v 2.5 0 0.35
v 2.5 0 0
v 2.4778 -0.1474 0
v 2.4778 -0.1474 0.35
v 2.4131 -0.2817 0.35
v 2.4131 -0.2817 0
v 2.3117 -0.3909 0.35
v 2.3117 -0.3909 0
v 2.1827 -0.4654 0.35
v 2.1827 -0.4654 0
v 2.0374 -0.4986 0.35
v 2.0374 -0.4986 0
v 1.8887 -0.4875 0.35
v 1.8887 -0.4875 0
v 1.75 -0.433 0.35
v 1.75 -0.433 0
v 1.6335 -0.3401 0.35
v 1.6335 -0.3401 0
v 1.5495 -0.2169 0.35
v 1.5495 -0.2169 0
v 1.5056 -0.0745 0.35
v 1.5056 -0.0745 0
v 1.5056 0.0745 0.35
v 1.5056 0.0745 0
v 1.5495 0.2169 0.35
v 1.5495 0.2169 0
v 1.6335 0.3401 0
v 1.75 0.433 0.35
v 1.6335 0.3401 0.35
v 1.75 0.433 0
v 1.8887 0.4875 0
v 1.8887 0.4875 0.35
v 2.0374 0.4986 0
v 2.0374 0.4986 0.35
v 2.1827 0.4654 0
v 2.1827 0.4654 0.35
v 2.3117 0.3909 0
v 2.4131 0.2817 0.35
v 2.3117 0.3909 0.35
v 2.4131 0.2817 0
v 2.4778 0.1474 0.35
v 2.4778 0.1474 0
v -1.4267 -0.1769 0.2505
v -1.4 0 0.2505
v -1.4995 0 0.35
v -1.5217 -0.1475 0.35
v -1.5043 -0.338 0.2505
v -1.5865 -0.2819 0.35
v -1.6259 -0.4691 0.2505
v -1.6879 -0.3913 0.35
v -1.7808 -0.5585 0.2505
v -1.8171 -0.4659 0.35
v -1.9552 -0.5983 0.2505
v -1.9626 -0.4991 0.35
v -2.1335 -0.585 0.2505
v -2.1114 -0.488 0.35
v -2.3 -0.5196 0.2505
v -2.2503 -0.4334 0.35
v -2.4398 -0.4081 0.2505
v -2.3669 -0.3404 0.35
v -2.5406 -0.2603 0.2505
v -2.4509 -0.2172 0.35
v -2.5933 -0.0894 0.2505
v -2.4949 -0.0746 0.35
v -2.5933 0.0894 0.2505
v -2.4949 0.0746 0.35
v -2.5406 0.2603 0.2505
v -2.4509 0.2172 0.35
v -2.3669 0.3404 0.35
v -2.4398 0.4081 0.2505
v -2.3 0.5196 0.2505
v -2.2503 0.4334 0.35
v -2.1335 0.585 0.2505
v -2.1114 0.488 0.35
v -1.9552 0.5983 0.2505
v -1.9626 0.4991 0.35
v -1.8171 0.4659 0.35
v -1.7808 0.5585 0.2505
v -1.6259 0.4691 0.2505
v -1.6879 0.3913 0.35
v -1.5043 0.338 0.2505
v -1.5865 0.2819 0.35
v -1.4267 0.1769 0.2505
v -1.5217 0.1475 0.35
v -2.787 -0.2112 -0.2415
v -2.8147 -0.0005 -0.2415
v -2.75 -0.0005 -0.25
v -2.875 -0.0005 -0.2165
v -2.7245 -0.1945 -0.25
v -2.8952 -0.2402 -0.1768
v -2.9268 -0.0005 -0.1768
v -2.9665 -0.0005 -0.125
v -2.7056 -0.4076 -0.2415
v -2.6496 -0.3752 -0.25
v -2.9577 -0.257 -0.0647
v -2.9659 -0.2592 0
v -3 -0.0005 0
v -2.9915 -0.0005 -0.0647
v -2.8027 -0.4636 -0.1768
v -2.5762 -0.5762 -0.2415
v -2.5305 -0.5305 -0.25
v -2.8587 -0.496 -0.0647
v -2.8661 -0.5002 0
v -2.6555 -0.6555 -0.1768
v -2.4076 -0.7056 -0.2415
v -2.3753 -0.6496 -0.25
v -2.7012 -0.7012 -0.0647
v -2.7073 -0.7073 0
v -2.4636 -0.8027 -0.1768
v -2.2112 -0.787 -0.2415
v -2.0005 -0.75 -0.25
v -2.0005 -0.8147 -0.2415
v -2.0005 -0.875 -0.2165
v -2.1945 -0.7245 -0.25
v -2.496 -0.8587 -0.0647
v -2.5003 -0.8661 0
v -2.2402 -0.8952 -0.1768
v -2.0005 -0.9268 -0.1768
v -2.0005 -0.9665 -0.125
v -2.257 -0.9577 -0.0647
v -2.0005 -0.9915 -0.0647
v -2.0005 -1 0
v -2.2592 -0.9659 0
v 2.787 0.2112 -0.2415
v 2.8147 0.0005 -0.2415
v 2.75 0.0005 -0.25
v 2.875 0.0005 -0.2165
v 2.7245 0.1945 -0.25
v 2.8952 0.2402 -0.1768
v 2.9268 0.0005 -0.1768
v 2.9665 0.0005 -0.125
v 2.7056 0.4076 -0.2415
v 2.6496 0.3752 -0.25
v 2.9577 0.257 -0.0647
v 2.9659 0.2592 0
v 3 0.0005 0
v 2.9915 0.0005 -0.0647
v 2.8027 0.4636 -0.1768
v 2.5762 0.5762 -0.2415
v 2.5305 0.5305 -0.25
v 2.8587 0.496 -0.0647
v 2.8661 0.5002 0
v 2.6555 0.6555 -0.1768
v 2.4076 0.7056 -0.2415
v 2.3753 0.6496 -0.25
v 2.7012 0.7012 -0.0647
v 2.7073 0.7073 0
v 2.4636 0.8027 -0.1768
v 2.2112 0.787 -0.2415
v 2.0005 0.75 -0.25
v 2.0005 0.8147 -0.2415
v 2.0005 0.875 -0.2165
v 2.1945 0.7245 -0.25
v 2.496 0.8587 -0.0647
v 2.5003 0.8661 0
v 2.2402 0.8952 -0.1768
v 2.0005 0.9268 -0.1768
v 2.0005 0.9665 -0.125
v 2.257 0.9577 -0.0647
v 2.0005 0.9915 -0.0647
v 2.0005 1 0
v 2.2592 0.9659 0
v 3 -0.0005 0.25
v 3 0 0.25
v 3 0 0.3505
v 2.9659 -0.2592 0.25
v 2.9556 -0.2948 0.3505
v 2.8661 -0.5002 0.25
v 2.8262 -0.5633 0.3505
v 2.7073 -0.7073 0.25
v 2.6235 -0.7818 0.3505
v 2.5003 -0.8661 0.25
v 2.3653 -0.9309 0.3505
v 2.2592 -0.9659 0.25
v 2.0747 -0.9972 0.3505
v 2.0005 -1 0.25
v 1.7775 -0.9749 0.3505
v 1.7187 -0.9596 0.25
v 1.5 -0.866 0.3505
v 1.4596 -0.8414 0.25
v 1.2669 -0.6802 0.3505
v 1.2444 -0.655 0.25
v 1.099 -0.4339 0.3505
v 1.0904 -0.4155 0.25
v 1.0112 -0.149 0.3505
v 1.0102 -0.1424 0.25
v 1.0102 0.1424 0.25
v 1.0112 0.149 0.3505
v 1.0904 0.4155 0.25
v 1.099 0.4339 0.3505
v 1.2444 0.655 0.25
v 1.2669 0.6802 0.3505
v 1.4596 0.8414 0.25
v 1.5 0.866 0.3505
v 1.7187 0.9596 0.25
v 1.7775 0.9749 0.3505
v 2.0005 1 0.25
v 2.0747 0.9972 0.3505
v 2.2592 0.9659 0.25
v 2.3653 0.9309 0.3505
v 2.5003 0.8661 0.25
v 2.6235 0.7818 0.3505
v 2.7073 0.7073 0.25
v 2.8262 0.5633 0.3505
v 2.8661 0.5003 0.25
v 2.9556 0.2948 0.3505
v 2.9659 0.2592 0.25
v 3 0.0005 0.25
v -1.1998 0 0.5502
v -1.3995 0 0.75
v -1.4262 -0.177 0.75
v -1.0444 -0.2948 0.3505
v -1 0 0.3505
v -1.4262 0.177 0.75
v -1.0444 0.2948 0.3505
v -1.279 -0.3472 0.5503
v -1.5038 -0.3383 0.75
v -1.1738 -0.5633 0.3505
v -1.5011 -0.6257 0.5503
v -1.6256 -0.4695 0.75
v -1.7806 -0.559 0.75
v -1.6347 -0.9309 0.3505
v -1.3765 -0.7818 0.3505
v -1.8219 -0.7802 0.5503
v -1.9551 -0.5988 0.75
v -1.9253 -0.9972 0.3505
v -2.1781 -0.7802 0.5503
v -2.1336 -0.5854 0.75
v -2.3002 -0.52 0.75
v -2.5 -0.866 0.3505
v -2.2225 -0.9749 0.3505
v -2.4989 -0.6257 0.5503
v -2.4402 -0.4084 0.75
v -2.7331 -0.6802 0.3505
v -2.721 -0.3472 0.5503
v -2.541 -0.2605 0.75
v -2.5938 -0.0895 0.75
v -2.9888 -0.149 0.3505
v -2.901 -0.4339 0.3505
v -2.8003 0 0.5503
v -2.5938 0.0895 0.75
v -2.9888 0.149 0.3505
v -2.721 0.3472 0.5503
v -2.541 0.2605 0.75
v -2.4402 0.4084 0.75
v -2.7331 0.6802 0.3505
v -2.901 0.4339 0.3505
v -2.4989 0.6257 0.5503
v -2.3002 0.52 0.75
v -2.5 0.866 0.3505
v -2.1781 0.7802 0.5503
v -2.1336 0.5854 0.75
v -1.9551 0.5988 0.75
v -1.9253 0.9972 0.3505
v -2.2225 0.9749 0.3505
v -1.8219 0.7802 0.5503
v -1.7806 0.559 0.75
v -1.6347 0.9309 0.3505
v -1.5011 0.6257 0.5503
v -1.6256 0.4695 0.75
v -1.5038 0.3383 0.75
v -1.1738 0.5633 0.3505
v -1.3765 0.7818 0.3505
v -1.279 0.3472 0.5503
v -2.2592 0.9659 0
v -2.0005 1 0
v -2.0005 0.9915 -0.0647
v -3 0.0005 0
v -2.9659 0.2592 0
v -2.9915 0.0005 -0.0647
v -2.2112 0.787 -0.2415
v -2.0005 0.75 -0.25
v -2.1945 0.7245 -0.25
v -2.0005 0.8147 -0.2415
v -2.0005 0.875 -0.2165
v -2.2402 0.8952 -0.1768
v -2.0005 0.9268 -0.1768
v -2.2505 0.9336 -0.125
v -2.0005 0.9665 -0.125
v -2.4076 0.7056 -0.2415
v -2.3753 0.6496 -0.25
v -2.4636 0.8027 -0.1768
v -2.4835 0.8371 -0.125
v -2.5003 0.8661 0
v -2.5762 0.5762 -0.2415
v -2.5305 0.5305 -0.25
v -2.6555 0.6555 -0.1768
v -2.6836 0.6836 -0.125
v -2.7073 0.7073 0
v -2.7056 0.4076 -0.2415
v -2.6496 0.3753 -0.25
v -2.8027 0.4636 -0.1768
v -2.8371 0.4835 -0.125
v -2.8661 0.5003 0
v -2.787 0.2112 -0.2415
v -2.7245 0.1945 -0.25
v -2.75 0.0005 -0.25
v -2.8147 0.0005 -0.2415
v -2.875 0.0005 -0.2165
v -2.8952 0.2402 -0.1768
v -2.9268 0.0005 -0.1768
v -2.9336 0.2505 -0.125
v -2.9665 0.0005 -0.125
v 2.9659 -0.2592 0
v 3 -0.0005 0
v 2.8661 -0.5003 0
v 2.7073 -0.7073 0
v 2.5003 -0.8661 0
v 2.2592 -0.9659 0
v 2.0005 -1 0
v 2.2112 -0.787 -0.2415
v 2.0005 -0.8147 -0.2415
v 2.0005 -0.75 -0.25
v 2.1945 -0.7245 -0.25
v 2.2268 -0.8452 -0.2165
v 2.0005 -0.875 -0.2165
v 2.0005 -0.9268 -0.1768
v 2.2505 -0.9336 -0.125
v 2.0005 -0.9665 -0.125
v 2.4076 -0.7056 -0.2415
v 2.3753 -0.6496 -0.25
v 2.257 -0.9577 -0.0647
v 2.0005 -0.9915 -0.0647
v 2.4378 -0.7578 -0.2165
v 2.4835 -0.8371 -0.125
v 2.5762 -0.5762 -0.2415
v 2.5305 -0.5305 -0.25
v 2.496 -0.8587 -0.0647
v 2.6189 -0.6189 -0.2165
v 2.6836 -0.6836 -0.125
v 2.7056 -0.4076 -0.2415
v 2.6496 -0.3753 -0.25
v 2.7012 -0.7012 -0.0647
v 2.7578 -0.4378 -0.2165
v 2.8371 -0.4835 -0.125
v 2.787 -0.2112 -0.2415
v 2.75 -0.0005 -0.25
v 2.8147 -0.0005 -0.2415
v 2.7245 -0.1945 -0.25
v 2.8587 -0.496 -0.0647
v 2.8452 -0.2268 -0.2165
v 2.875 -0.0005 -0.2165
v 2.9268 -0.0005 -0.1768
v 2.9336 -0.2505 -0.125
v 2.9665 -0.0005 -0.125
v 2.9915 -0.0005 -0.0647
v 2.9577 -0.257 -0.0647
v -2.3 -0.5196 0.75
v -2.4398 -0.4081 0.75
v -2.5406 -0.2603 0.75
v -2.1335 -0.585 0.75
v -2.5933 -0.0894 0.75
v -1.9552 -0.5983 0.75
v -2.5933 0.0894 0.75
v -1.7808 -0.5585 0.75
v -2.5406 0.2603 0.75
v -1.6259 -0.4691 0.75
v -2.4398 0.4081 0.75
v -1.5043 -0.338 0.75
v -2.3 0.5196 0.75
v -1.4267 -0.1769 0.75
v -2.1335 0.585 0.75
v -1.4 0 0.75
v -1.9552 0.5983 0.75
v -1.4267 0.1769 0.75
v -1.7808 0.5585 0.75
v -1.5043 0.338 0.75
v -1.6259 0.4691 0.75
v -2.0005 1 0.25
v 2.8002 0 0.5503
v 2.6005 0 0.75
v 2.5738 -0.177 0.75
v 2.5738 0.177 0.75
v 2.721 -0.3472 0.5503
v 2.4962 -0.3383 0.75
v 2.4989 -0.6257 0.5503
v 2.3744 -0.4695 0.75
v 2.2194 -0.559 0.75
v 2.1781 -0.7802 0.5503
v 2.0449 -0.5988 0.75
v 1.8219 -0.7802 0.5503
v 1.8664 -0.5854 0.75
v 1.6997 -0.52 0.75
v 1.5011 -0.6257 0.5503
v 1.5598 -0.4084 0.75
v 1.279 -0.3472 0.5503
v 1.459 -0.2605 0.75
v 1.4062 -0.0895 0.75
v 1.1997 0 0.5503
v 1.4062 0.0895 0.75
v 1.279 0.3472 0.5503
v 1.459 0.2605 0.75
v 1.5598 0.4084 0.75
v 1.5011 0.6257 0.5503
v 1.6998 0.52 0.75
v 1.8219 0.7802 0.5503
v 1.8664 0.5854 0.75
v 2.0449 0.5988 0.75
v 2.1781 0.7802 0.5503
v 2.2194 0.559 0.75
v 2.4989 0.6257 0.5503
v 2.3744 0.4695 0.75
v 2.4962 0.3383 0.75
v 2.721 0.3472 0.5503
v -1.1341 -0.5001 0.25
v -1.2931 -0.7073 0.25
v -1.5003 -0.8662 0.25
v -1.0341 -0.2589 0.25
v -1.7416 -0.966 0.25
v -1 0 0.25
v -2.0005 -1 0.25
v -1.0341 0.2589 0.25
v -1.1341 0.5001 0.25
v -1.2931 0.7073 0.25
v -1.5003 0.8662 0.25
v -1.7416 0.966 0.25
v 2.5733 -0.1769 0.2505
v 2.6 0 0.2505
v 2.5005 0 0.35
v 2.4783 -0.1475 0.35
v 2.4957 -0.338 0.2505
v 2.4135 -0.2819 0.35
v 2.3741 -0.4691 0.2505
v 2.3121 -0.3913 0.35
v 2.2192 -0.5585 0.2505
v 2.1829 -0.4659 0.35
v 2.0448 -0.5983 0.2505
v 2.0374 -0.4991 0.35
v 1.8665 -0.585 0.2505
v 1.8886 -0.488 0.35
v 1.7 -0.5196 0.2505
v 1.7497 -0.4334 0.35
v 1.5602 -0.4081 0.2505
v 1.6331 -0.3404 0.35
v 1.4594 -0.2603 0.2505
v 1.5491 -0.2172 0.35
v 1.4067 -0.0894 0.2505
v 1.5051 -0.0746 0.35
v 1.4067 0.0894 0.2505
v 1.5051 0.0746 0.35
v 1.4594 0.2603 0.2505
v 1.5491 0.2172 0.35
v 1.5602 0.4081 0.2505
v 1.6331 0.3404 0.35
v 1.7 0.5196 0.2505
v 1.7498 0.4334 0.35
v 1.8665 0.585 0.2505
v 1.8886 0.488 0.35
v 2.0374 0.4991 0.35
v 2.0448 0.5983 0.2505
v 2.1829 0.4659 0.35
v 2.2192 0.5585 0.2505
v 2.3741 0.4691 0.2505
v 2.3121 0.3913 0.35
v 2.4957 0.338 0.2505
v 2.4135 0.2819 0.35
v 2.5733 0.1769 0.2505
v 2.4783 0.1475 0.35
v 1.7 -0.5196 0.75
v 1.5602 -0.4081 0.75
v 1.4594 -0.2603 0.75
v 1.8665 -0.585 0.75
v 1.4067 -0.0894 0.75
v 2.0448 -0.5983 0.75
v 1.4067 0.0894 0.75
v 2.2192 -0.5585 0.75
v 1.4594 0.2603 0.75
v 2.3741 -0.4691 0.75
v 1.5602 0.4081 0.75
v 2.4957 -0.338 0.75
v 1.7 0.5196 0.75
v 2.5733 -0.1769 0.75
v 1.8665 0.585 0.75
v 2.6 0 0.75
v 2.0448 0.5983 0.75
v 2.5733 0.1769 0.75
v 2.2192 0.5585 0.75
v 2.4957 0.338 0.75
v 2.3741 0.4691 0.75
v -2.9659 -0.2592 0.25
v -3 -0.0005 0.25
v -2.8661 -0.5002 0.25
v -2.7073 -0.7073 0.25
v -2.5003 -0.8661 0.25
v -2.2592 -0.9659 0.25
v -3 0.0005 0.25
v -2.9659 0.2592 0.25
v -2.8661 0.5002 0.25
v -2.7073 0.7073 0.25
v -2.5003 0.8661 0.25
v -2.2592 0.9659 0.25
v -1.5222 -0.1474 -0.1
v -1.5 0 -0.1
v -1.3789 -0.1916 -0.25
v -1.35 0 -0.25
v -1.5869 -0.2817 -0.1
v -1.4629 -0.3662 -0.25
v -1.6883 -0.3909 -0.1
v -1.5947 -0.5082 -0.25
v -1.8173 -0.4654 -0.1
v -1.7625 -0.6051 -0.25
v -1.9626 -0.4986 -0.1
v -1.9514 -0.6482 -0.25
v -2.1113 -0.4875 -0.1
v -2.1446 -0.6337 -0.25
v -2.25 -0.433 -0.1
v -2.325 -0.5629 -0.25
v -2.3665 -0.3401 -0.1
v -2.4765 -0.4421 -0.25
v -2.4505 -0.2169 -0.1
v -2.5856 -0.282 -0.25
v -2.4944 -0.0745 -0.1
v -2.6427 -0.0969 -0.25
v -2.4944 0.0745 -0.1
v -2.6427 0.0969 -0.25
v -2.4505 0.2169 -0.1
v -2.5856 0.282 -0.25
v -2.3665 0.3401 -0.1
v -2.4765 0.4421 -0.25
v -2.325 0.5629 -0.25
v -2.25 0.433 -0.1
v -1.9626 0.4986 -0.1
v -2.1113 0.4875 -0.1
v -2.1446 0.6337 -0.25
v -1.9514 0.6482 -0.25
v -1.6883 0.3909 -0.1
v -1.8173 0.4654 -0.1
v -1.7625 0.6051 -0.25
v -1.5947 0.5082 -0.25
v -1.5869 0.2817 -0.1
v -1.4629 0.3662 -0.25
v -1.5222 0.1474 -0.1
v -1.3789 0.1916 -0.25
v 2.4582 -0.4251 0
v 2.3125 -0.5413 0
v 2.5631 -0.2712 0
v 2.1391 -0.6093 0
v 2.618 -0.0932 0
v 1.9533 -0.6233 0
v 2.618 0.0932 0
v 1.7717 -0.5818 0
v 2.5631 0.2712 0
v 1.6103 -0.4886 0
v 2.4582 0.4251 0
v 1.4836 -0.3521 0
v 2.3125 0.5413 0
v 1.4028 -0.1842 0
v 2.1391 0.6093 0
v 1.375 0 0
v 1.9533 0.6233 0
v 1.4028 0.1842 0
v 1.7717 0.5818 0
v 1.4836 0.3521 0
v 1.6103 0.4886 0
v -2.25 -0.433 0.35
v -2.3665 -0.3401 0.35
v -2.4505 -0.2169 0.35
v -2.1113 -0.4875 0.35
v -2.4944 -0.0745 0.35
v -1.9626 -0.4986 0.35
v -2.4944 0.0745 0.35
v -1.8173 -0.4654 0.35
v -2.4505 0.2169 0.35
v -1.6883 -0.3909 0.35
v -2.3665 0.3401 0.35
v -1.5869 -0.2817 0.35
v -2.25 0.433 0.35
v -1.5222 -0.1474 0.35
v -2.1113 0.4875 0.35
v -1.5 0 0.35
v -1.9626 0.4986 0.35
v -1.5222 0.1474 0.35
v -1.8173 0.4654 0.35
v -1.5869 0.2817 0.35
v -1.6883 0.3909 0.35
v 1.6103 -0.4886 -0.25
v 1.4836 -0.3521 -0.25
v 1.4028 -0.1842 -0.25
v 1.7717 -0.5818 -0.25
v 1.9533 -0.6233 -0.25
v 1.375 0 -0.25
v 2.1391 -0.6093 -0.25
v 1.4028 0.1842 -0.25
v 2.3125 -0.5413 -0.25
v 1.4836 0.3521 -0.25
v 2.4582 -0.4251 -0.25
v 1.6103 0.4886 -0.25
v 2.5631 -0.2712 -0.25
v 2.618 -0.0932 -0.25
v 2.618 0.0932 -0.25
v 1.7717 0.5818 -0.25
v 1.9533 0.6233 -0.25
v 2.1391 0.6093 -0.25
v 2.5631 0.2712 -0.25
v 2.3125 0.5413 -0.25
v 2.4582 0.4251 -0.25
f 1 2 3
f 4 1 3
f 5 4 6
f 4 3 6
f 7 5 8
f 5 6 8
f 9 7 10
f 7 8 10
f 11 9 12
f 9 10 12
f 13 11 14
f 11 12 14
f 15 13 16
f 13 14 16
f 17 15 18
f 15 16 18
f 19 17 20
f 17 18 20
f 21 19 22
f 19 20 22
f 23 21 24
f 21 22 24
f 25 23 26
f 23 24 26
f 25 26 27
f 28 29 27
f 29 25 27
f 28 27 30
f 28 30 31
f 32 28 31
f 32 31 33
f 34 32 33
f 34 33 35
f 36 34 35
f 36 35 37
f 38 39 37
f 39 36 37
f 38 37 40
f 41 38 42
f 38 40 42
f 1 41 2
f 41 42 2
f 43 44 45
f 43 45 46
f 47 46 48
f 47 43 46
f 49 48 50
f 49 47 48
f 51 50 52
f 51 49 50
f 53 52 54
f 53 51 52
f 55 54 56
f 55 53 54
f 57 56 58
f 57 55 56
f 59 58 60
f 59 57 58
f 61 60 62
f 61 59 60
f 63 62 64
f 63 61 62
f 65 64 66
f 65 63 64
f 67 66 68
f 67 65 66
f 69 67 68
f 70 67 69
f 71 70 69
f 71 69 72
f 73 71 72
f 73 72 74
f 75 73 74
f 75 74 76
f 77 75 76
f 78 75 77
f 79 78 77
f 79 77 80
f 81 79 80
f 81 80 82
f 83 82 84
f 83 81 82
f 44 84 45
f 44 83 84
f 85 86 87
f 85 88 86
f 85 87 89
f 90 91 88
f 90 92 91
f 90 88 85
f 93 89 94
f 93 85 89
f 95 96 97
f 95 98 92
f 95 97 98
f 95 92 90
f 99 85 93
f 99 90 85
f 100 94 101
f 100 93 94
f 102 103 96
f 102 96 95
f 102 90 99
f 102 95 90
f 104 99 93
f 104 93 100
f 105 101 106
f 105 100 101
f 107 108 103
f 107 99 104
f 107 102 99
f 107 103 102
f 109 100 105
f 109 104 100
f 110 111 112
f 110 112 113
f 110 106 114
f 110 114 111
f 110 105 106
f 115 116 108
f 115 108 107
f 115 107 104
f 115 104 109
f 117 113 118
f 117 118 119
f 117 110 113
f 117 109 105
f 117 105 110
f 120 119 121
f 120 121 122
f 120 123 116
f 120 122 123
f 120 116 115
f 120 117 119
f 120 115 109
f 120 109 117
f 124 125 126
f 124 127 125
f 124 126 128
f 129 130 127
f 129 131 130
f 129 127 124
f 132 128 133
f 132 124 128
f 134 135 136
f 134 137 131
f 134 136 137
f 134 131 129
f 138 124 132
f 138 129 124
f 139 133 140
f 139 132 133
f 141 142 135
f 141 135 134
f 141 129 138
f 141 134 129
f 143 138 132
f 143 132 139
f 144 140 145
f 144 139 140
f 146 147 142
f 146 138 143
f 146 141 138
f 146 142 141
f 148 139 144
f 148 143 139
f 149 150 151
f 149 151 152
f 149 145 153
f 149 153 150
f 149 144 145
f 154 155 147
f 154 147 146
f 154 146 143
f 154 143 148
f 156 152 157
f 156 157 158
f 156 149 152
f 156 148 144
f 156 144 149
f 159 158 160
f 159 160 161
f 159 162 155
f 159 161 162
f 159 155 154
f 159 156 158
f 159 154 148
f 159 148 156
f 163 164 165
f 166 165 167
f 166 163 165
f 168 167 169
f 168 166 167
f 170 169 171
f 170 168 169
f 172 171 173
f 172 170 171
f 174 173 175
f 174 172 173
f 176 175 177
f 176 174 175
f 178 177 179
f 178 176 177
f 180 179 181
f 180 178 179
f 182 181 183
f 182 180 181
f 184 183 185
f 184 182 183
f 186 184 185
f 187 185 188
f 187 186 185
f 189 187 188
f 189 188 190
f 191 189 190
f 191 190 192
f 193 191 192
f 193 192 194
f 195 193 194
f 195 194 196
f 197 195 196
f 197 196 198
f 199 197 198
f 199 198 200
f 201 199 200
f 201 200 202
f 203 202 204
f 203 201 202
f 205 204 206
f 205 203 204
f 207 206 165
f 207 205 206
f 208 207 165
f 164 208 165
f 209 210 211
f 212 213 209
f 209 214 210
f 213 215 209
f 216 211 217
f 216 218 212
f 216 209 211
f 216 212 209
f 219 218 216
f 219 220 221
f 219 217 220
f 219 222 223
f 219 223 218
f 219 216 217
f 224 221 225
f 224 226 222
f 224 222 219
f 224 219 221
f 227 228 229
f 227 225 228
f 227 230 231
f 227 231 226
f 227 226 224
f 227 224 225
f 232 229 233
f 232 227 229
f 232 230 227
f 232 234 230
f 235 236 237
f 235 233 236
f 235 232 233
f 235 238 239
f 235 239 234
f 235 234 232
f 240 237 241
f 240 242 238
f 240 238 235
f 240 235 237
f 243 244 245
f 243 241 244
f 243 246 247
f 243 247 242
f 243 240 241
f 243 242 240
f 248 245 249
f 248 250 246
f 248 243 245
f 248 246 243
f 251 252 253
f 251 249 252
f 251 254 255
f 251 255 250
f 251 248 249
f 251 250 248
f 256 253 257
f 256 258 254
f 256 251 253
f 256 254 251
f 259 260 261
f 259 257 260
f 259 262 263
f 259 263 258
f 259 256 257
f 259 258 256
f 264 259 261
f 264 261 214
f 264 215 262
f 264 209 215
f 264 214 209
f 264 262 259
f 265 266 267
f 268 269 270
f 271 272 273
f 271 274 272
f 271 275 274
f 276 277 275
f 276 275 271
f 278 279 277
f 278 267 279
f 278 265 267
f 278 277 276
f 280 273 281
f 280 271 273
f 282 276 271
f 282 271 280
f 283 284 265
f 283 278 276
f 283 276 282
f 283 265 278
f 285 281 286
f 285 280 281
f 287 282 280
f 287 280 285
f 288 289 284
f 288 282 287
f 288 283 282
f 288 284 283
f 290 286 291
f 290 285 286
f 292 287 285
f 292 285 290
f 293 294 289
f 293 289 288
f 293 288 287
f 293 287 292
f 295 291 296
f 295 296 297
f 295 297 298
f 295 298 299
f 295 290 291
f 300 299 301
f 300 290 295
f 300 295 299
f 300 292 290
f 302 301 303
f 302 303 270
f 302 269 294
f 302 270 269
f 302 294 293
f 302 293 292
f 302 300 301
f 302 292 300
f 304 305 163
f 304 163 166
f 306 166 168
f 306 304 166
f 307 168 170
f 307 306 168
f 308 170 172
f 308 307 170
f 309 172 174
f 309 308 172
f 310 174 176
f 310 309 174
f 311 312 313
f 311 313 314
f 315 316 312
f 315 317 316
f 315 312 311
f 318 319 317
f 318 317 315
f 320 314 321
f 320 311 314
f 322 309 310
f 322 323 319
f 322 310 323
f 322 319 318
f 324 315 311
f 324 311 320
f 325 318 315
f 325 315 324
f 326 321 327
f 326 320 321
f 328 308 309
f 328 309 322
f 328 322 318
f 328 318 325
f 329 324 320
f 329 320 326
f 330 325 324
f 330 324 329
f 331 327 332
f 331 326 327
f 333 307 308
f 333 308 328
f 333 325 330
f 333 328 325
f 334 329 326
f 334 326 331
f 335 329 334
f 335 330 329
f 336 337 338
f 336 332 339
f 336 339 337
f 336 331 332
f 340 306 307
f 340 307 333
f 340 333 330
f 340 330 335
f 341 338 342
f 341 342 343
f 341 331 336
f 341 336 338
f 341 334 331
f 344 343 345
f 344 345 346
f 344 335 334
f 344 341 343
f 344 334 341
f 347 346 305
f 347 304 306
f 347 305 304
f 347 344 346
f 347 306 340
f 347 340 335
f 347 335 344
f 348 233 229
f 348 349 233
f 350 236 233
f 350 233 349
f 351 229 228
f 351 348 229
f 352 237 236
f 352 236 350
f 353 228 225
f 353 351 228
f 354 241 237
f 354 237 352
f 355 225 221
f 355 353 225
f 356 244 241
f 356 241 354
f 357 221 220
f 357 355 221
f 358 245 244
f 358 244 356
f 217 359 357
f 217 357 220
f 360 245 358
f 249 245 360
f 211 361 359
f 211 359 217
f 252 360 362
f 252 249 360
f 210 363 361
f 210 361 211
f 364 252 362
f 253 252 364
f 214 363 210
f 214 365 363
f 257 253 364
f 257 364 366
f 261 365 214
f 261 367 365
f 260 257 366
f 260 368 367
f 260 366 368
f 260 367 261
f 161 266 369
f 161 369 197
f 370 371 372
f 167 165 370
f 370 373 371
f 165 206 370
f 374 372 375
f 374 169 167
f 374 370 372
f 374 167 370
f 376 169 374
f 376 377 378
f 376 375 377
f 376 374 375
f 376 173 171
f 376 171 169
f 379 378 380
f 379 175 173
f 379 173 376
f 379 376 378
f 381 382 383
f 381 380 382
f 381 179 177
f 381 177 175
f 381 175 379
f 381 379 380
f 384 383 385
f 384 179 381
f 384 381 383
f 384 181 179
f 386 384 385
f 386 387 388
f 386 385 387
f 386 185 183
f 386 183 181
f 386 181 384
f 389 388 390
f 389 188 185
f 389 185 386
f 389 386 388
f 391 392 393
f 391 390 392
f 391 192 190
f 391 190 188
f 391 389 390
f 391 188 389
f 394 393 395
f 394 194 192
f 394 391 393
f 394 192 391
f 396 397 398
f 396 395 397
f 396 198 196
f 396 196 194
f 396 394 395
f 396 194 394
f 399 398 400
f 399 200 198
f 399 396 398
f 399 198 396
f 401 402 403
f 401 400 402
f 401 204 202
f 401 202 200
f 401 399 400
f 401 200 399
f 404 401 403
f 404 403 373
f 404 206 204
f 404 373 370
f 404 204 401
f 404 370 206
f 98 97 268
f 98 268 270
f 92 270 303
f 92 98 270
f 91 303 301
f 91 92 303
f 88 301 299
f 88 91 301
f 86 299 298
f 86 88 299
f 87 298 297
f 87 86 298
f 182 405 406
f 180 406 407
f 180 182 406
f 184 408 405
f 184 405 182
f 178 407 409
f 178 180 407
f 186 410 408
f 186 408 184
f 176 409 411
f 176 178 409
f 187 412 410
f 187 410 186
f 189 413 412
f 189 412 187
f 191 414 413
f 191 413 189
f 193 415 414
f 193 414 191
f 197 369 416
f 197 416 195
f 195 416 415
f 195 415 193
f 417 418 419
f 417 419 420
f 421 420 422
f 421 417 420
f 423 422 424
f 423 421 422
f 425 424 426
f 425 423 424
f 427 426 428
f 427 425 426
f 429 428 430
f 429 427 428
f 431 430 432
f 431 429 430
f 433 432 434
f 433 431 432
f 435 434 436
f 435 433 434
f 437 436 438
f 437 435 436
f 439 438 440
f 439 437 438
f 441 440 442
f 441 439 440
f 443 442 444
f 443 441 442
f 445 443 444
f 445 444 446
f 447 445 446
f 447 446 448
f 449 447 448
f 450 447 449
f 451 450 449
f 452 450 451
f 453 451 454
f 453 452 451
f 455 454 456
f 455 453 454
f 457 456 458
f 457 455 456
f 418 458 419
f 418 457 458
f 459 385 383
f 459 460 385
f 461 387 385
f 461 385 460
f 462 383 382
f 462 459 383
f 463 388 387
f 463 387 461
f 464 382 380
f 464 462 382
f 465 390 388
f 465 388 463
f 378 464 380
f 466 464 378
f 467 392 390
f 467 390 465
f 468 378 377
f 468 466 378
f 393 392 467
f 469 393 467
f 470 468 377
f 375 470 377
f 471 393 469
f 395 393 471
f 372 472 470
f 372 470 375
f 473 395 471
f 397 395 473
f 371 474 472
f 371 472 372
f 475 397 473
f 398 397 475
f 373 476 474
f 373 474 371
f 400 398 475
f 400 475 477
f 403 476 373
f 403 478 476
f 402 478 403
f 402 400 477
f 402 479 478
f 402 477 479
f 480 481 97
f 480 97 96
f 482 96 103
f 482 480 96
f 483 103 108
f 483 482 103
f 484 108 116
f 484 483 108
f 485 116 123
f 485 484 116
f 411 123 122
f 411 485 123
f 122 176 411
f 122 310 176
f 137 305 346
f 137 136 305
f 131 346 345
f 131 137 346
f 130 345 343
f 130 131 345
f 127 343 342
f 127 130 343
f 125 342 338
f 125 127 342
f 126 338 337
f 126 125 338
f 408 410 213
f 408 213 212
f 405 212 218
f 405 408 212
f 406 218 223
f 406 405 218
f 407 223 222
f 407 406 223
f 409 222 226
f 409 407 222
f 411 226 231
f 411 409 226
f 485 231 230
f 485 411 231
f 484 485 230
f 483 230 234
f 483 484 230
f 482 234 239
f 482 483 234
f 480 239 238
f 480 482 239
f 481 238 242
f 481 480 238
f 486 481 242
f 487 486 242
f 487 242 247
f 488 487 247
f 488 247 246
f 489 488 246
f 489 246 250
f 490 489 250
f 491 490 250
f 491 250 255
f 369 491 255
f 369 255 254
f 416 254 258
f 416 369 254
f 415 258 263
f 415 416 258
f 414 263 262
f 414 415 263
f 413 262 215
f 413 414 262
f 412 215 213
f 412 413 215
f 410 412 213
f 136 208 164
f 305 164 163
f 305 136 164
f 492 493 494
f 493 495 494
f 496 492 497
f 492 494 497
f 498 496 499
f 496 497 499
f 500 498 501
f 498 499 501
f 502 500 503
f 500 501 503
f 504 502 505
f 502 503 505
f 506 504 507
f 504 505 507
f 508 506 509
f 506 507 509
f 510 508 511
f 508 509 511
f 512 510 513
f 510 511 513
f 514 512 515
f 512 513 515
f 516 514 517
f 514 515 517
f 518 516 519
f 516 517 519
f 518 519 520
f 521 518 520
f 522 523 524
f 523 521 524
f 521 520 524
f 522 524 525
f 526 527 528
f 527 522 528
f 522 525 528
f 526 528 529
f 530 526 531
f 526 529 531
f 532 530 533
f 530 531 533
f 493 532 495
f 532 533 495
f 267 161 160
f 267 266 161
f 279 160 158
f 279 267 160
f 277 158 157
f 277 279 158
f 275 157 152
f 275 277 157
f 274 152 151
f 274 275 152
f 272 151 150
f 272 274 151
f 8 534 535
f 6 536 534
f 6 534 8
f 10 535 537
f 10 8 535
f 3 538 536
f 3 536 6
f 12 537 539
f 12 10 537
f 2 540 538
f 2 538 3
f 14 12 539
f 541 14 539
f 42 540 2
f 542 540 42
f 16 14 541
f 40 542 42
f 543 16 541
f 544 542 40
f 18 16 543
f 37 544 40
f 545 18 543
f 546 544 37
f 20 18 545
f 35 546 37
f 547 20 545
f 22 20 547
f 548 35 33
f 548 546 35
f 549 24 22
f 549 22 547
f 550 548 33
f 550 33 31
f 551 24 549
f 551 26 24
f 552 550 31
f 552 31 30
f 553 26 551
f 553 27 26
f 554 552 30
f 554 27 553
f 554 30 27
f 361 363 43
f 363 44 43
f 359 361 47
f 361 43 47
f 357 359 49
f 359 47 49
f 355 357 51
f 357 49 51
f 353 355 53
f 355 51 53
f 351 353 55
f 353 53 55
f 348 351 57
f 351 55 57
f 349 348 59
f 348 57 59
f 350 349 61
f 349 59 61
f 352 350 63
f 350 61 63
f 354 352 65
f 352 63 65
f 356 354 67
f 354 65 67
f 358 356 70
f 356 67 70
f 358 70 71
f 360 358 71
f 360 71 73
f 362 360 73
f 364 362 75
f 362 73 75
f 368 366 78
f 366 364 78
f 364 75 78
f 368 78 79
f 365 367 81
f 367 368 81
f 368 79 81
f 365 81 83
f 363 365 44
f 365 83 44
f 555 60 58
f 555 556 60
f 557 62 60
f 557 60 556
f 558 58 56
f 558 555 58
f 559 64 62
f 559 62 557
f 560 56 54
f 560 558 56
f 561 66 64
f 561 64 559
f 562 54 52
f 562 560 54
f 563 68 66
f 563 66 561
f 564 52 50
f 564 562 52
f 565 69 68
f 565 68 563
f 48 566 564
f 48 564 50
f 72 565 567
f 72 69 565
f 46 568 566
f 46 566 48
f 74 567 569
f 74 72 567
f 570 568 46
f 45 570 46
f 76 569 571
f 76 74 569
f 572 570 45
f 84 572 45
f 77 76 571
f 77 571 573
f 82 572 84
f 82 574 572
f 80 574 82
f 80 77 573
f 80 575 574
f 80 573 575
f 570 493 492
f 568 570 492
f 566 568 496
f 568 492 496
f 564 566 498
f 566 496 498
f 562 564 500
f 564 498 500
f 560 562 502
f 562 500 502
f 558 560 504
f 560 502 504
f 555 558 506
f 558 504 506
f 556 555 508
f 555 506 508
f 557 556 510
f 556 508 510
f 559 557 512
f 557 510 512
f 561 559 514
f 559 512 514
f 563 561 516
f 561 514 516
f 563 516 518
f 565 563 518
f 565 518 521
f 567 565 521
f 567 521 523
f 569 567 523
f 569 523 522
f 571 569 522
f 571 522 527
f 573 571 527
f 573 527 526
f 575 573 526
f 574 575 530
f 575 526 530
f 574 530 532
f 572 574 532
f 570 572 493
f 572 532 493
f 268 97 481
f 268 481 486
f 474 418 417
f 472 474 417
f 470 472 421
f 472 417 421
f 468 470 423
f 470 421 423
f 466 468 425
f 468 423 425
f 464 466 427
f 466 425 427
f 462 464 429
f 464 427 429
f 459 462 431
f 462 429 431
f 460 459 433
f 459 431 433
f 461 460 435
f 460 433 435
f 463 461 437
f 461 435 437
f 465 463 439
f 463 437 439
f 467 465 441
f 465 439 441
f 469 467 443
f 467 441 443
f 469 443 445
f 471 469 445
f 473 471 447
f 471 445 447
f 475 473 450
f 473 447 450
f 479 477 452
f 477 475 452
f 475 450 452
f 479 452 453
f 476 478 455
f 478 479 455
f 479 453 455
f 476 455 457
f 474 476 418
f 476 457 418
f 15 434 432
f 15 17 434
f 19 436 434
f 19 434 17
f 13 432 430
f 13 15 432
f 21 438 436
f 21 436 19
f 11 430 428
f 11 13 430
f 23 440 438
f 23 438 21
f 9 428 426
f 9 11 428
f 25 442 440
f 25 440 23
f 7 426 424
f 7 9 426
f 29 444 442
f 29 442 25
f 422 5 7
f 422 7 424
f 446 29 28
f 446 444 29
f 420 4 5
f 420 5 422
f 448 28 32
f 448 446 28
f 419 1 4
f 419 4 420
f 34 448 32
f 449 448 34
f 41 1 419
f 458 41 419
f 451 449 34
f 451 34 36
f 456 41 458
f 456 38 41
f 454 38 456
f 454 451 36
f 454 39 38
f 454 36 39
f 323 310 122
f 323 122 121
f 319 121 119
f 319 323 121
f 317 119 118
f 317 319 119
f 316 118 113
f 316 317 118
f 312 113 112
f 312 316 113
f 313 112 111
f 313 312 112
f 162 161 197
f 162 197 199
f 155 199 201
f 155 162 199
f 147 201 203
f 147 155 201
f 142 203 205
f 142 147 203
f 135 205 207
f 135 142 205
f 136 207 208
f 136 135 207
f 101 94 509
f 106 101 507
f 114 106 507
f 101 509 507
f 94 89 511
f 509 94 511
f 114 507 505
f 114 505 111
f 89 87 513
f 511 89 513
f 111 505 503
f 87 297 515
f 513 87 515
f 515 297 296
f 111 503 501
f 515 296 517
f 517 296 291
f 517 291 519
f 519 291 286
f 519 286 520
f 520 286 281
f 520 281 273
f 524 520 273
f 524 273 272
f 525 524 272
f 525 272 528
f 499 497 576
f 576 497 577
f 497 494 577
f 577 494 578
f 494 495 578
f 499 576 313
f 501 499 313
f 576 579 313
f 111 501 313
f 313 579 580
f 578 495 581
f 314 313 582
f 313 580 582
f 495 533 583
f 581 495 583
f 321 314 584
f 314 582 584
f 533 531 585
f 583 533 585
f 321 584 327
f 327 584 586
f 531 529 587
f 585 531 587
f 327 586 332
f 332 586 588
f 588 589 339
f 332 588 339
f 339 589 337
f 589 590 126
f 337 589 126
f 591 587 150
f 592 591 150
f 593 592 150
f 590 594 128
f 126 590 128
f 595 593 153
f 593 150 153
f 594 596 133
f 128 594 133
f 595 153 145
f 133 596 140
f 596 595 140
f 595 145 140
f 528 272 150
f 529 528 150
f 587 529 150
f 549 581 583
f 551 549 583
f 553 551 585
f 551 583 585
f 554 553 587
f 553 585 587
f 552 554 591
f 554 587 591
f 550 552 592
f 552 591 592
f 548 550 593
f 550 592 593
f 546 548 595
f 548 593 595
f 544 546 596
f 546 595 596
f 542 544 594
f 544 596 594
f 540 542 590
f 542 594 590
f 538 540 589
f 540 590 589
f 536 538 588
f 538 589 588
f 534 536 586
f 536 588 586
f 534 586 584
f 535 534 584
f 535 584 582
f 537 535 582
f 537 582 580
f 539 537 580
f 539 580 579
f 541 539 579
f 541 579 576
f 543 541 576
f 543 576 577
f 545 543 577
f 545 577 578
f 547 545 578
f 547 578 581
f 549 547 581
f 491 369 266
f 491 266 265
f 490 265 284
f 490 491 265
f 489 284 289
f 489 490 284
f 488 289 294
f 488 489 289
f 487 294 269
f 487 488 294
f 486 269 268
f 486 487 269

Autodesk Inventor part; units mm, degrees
ref_plane "YZ Plane" through (0, 0, 0) normal (1, 0, 0) x (0, 1, 0)
ref_plane "XZ Plane" through (0, 0, 0) normal (0, 1, 0) x (-1, 0, 0)
ref_plane "XY Plane" through (0, 0, 0) normal (0, 0, 1) x (1, 0, 0)
sketch "Sketch1" plane through (0, 0, 0) normal (0, 0, 1) x (1, 0, 0)
  line L0 (-3, 1) -> (3, 1)
  line L1 (3, 1) -> (3, -1)
  line L2 (3, -1) -> (-3, -1)
  line L3 (-3, -1) -> (-3, 1)
  circle A0 centre (-2, 0) radius 0.5
  circle A1 centre (2, 0) radius 0.5
  point P0 (0, 0)
  point P1 (-3, 0)
  point P2 (0, 1)
  dimension "d0" = 6
  dimension "d1" = 2
  dimension "d2" = 1
  dimension "d3" = 1
  dimension "d4" = 4
  dimension "d5" = 2
extrude "Extrusion1" add sketch "Sketch1" along normal mid plane 0.5
fillet "Fillet1" radius 1 4 edges at (3, 1, 0) (3, -1, 0) (-3, 1, 0) (-3, -1, 0)
sketch "Sketch2" plane through (0, 0, 0.25) normal (0, 0, 1) x (1, 0, 0)
  circle A0 centre (-2, 0) radius 0.5 projected
  circle A1 centre (-2, 0) radius 0.6
  circle A2 centre (2, 0) radius 0.5 projected
  circle A3 centre (2, 0) radius 0.6
  circle A4 centre (2, 0) radius 1
  circle A5 centre (-2, 0) radius 1
  point P0 (0, 0)
  dimension "d9" = 1.2
  dimension "d15" = 1.2
  dimension "d21" = 2
  dimension "d22" = 2
extrude "Extrusion2" add sketch "Sketch2" along normal blind 0.1 contours A1
chamfer "Chamfer1" distance 0.1 angle 45 1 edges at (-2.6, 0, 0.35)
extrude "Extrusion3" add sketch "Sketch2" along normal blind 0.1 contours A3
chamfer "Chamfer2" distance 0.1 angle 45 1 edges at (1.4, 0, 0.35)
extrude "Extrusion4" add sketch "Sketch2" along normal blind 0.5 contours A4 | A5
chamfer "Chamfer3" distance 0.4 angle 45 2 edges at (1, 0, 0.75) (-3, 0, 0.75)
fillet "Fillet2" radius 0.25 4 edges at (-2.7073, 0.7073, -0.25) (0, 1, -0.25) (2.7073, 0.7073, -0.25) (0, -1, -0.25)
chamfer "Chamfer4" distance 0.15 angle 45 1 edges at (-2.5, 0, -0.25)
sketch "Sketch3" plane through (0, 0, -0.25) normal (0, 0, -1) x (-1, 0, 0)
  circle A0 centre (-2, 0) radius 0.5 projected
  circle A1 centre (2, 0) radius 0.65 projected
  arc A2 (2, -0.75) -> (2, 0.75) centre (2, 0) ccw projected
  line L0 (-2, 0.75) -> (2, 0.75) projected
  arc A3 (-2, 0.75) -> (-2, -0.75) centre (-2, 0) ccw projected
  line L1 (2, -0.75) -> (-2, -0.75) projected
  circle A4 centre (-2, 0) radius 0.5 projected
  circle A5 centre (2, 0) radius 0.65 projected
  circle A6 centre (-2, 0) radius 0.5 projected
  circle A7 centre (-2, 0) radius 0.625
  point P0 (0, 0)
  dimension "d32" = 1.25
extrude "Extrusion5" cut sketch "Sketch3" against normal blind 0.25 contours A7
properties part number "Link_1"
